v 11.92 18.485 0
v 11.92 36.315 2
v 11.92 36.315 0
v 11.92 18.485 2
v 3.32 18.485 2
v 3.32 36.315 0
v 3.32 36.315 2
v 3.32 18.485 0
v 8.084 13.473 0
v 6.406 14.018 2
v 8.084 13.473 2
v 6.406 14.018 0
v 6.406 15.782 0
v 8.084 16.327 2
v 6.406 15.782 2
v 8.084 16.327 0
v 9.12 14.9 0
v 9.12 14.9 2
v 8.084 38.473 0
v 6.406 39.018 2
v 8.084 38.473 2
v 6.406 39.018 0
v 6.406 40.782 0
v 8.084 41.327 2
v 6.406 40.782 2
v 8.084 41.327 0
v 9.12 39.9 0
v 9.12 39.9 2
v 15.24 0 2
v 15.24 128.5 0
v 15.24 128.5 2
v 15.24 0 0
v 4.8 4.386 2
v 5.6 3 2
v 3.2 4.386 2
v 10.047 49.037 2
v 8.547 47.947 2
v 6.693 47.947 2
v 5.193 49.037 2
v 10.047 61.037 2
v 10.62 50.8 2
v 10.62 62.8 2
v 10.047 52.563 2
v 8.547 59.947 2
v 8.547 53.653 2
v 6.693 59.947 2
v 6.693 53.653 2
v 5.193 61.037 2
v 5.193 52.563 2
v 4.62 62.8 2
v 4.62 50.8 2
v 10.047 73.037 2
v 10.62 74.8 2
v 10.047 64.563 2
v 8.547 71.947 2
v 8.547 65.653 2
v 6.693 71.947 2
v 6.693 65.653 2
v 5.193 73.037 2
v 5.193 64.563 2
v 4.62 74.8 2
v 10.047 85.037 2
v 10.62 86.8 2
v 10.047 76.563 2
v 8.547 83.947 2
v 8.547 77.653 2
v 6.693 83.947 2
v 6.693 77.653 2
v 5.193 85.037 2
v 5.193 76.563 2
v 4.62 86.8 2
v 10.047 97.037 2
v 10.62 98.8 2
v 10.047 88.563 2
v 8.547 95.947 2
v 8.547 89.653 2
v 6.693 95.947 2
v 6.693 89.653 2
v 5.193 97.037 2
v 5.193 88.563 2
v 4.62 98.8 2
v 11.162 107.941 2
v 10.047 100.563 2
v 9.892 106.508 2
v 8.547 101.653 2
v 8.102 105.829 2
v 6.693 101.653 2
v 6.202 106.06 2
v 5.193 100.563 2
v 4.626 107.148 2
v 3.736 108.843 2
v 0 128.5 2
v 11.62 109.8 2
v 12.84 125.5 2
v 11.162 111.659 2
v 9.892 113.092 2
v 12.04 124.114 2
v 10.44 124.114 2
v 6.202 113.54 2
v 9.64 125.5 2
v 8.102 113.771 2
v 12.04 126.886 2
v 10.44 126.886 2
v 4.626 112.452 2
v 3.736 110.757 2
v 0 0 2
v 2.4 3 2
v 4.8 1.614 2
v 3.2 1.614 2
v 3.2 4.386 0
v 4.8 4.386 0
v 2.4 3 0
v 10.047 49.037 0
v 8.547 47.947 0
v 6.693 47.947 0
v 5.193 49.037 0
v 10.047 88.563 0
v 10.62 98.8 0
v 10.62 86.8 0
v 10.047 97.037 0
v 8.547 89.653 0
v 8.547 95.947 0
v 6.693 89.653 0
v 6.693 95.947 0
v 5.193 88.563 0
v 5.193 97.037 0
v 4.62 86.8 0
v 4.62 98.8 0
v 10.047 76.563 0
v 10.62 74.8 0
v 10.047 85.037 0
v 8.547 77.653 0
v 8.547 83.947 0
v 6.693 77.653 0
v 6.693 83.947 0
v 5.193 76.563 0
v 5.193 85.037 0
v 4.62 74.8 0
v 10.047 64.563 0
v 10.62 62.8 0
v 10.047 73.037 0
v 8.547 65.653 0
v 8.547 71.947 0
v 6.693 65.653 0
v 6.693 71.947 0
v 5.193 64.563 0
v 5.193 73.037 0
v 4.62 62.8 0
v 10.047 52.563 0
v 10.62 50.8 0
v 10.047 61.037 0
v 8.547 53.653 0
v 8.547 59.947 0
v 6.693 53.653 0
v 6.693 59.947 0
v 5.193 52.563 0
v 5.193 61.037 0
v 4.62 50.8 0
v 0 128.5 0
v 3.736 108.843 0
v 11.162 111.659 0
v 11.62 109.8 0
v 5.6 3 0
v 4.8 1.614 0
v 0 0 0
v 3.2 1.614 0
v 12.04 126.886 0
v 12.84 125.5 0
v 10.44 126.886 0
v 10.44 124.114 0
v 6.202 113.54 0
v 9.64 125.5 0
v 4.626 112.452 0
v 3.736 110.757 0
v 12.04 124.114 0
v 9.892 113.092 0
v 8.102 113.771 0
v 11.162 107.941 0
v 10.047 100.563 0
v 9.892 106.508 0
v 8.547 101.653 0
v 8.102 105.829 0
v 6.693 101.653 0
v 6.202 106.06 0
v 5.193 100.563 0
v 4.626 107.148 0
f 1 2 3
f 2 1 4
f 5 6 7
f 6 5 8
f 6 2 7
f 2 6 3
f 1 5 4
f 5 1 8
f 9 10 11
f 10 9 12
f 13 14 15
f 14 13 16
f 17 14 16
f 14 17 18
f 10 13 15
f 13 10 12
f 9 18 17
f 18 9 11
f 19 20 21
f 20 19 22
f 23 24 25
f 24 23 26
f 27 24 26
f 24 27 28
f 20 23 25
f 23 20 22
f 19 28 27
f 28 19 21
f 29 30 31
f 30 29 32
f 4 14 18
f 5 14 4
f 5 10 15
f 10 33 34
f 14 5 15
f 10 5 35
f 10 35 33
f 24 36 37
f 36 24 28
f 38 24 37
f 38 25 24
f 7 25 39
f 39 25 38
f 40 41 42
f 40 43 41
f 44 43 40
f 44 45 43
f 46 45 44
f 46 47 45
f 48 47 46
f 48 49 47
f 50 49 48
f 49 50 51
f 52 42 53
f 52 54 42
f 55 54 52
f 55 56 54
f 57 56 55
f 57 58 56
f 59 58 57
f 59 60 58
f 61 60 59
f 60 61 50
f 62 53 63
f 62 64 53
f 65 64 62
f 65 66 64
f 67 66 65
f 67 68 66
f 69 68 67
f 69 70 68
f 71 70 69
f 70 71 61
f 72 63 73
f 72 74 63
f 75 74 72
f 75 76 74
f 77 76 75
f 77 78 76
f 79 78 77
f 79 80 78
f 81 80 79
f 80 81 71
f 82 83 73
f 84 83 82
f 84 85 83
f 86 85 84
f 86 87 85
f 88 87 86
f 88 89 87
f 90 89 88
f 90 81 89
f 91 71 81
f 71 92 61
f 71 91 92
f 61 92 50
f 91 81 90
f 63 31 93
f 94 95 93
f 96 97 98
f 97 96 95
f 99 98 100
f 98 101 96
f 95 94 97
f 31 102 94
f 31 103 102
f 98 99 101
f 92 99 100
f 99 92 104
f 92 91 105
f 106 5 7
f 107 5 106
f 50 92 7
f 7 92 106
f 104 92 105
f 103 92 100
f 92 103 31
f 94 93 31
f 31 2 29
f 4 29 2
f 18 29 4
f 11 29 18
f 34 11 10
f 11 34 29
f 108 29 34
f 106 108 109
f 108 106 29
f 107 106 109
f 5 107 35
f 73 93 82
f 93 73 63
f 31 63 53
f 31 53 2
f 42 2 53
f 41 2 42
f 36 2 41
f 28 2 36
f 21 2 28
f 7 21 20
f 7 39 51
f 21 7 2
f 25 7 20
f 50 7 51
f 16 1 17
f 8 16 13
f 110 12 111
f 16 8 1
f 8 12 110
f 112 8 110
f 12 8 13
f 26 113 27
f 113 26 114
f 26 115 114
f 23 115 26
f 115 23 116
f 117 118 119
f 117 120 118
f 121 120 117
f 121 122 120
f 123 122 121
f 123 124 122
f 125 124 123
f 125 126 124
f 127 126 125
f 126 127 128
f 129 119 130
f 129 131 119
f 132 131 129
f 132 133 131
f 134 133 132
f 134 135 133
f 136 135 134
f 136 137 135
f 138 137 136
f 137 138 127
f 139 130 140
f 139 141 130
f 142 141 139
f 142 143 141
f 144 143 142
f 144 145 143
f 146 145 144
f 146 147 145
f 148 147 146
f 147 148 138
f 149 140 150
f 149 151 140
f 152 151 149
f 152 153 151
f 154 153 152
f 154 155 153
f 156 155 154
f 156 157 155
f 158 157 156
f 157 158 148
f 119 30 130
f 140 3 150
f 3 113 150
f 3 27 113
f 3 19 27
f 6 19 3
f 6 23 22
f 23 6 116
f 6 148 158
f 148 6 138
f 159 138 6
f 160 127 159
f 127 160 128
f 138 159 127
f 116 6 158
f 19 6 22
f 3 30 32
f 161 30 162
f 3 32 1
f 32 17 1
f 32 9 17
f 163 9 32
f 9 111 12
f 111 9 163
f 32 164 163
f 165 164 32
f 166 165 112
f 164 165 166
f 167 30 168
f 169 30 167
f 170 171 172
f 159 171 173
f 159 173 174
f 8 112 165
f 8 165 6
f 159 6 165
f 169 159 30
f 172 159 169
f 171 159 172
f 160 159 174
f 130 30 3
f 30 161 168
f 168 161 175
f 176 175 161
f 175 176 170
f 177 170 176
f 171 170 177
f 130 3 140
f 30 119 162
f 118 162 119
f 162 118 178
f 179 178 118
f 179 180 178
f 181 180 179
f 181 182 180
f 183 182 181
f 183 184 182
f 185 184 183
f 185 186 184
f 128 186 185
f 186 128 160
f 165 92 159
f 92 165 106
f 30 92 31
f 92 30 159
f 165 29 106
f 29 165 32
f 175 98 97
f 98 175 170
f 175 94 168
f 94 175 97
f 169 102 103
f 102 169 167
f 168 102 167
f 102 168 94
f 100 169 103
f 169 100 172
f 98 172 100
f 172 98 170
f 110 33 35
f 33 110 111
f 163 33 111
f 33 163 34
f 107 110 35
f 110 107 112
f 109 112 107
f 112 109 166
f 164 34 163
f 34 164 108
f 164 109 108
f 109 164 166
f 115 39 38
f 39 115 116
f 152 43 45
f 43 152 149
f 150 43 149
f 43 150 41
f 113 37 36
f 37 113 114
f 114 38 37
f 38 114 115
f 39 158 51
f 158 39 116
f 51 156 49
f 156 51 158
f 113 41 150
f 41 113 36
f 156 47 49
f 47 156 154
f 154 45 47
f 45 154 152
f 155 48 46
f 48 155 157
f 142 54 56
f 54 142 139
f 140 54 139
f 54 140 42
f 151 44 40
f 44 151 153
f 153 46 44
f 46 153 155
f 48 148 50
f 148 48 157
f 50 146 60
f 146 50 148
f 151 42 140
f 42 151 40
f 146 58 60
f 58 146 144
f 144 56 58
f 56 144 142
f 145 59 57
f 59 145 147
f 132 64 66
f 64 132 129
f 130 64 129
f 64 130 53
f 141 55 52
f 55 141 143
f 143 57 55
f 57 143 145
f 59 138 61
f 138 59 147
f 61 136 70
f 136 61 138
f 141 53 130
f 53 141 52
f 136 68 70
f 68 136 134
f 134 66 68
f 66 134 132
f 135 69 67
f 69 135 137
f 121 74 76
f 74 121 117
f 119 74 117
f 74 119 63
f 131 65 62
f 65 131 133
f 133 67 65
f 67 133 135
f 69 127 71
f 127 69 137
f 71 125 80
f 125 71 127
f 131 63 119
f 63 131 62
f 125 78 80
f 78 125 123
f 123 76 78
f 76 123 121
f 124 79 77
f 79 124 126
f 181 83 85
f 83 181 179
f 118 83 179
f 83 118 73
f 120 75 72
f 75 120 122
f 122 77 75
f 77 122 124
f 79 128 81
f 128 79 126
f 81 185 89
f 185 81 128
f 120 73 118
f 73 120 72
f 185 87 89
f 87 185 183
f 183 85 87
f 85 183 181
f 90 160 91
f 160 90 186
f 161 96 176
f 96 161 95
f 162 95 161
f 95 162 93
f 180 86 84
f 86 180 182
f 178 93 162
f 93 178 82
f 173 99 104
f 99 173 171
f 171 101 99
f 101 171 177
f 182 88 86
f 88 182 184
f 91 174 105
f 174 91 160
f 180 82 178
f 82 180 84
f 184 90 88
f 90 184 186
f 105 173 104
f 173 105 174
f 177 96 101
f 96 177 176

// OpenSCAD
// Dimensions
panel_width = 3 * 5.08; // 3HP
panel_height = 128.5;   // 3U
panel_thickness = 2.00;

// Mounting holes
mount_offset_y = 3;
mount_offset_x = 4;
mounting_hole_diameter = 3.2; // M3

// Compoonent hole sizes
jack_hole_diameter = 6; // 3.5mm
toggle_hole_diameter = 8; // 3.5mm
vga_conn_height = 16.33 + 1.5;
vga_conn_width = 7.9 + 0.7;
vga_height = 30.8;
vga_screws_distance = 25;
vga_screwhole_diameter = 2.5 + 0.5;

jack_height = 10;
toggle_height = 8;

module mounting_hole(x_pos, y_pos) {
    translate([x_pos, y_pos, panel_thickness / 2])
        cylinder(d = mounting_hole_diameter, h = panel_thickness + 1, center = true);
}

module jack(y_pos) {
    translate([panel_width/2, y_pos, panel_thickness / 2])
        cylinder(d = jack_hole_diameter, h = panel_thickness + 1, center = true);
}

module toggle(y_pos) {
    translate([panel_width/2, y_pos, panel_thickness / 2])
        cylinder(d = toggle_hole_diameter, h = panel_thickness + 1, center = true);
}

module vga(y_pos) {
    translate([(panel_width - vga_conn_width)/2, y_pos + ((vga_height-vga_conn_height) / 2) , -1])
        cube([vga_conn_width, vga_conn_height, panel_thickness + 2]);

    translate([panel_width/2, y_pos + (vga_height/2) - (vga_screws_distance/2), panel_thickness / 2])
        cylinder(d = vga_screwhole_diameter, h = panel_thickness + 1, center = true);

    translate([panel_width/2, y_pos + (vga_height/2) + (vga_screws_distance/2), panel_thickness / 2])
        cylinder(d = vga_screwhole_diameter, h = panel_thickness + 1, center = true);
}


buffer = 0.5;

jack2jack_y = jack_height + 2;

vga_y = 12;
jack1_y = vga_y + vga_height + jack_height/2 + 3;
jack2_y = jack1_y + jack2jack_y;
jack3_y = jack2_y + jack2jack_y;
jack4_y = jack3_y + jack2jack_y;
jack5_y = jack4_y + jack2jack_y;
toggle1_y = jack5_y + (jack_height + toggle_height)/2 + 2;

module panel() {
    difference() {
        // Base panel
        cube([panel_width, panel_height, panel_thickness]);

        // Mounting holes
        mounting_hole(panel_width - mount_offset_x, panel_height - mount_offset_y);
        mounting_hole(mount_offset_x, mount_offset_y);

        // Components (Jacks, Toggles, Pot)
        vga(vga_y);
        jack(jack1_y);
        jack(jack2_y);
        jack(jack3_y);
        jack(jack4_y);
        jack(jack5_y);
        toggle(toggle1_y);
    }
}

panel();
